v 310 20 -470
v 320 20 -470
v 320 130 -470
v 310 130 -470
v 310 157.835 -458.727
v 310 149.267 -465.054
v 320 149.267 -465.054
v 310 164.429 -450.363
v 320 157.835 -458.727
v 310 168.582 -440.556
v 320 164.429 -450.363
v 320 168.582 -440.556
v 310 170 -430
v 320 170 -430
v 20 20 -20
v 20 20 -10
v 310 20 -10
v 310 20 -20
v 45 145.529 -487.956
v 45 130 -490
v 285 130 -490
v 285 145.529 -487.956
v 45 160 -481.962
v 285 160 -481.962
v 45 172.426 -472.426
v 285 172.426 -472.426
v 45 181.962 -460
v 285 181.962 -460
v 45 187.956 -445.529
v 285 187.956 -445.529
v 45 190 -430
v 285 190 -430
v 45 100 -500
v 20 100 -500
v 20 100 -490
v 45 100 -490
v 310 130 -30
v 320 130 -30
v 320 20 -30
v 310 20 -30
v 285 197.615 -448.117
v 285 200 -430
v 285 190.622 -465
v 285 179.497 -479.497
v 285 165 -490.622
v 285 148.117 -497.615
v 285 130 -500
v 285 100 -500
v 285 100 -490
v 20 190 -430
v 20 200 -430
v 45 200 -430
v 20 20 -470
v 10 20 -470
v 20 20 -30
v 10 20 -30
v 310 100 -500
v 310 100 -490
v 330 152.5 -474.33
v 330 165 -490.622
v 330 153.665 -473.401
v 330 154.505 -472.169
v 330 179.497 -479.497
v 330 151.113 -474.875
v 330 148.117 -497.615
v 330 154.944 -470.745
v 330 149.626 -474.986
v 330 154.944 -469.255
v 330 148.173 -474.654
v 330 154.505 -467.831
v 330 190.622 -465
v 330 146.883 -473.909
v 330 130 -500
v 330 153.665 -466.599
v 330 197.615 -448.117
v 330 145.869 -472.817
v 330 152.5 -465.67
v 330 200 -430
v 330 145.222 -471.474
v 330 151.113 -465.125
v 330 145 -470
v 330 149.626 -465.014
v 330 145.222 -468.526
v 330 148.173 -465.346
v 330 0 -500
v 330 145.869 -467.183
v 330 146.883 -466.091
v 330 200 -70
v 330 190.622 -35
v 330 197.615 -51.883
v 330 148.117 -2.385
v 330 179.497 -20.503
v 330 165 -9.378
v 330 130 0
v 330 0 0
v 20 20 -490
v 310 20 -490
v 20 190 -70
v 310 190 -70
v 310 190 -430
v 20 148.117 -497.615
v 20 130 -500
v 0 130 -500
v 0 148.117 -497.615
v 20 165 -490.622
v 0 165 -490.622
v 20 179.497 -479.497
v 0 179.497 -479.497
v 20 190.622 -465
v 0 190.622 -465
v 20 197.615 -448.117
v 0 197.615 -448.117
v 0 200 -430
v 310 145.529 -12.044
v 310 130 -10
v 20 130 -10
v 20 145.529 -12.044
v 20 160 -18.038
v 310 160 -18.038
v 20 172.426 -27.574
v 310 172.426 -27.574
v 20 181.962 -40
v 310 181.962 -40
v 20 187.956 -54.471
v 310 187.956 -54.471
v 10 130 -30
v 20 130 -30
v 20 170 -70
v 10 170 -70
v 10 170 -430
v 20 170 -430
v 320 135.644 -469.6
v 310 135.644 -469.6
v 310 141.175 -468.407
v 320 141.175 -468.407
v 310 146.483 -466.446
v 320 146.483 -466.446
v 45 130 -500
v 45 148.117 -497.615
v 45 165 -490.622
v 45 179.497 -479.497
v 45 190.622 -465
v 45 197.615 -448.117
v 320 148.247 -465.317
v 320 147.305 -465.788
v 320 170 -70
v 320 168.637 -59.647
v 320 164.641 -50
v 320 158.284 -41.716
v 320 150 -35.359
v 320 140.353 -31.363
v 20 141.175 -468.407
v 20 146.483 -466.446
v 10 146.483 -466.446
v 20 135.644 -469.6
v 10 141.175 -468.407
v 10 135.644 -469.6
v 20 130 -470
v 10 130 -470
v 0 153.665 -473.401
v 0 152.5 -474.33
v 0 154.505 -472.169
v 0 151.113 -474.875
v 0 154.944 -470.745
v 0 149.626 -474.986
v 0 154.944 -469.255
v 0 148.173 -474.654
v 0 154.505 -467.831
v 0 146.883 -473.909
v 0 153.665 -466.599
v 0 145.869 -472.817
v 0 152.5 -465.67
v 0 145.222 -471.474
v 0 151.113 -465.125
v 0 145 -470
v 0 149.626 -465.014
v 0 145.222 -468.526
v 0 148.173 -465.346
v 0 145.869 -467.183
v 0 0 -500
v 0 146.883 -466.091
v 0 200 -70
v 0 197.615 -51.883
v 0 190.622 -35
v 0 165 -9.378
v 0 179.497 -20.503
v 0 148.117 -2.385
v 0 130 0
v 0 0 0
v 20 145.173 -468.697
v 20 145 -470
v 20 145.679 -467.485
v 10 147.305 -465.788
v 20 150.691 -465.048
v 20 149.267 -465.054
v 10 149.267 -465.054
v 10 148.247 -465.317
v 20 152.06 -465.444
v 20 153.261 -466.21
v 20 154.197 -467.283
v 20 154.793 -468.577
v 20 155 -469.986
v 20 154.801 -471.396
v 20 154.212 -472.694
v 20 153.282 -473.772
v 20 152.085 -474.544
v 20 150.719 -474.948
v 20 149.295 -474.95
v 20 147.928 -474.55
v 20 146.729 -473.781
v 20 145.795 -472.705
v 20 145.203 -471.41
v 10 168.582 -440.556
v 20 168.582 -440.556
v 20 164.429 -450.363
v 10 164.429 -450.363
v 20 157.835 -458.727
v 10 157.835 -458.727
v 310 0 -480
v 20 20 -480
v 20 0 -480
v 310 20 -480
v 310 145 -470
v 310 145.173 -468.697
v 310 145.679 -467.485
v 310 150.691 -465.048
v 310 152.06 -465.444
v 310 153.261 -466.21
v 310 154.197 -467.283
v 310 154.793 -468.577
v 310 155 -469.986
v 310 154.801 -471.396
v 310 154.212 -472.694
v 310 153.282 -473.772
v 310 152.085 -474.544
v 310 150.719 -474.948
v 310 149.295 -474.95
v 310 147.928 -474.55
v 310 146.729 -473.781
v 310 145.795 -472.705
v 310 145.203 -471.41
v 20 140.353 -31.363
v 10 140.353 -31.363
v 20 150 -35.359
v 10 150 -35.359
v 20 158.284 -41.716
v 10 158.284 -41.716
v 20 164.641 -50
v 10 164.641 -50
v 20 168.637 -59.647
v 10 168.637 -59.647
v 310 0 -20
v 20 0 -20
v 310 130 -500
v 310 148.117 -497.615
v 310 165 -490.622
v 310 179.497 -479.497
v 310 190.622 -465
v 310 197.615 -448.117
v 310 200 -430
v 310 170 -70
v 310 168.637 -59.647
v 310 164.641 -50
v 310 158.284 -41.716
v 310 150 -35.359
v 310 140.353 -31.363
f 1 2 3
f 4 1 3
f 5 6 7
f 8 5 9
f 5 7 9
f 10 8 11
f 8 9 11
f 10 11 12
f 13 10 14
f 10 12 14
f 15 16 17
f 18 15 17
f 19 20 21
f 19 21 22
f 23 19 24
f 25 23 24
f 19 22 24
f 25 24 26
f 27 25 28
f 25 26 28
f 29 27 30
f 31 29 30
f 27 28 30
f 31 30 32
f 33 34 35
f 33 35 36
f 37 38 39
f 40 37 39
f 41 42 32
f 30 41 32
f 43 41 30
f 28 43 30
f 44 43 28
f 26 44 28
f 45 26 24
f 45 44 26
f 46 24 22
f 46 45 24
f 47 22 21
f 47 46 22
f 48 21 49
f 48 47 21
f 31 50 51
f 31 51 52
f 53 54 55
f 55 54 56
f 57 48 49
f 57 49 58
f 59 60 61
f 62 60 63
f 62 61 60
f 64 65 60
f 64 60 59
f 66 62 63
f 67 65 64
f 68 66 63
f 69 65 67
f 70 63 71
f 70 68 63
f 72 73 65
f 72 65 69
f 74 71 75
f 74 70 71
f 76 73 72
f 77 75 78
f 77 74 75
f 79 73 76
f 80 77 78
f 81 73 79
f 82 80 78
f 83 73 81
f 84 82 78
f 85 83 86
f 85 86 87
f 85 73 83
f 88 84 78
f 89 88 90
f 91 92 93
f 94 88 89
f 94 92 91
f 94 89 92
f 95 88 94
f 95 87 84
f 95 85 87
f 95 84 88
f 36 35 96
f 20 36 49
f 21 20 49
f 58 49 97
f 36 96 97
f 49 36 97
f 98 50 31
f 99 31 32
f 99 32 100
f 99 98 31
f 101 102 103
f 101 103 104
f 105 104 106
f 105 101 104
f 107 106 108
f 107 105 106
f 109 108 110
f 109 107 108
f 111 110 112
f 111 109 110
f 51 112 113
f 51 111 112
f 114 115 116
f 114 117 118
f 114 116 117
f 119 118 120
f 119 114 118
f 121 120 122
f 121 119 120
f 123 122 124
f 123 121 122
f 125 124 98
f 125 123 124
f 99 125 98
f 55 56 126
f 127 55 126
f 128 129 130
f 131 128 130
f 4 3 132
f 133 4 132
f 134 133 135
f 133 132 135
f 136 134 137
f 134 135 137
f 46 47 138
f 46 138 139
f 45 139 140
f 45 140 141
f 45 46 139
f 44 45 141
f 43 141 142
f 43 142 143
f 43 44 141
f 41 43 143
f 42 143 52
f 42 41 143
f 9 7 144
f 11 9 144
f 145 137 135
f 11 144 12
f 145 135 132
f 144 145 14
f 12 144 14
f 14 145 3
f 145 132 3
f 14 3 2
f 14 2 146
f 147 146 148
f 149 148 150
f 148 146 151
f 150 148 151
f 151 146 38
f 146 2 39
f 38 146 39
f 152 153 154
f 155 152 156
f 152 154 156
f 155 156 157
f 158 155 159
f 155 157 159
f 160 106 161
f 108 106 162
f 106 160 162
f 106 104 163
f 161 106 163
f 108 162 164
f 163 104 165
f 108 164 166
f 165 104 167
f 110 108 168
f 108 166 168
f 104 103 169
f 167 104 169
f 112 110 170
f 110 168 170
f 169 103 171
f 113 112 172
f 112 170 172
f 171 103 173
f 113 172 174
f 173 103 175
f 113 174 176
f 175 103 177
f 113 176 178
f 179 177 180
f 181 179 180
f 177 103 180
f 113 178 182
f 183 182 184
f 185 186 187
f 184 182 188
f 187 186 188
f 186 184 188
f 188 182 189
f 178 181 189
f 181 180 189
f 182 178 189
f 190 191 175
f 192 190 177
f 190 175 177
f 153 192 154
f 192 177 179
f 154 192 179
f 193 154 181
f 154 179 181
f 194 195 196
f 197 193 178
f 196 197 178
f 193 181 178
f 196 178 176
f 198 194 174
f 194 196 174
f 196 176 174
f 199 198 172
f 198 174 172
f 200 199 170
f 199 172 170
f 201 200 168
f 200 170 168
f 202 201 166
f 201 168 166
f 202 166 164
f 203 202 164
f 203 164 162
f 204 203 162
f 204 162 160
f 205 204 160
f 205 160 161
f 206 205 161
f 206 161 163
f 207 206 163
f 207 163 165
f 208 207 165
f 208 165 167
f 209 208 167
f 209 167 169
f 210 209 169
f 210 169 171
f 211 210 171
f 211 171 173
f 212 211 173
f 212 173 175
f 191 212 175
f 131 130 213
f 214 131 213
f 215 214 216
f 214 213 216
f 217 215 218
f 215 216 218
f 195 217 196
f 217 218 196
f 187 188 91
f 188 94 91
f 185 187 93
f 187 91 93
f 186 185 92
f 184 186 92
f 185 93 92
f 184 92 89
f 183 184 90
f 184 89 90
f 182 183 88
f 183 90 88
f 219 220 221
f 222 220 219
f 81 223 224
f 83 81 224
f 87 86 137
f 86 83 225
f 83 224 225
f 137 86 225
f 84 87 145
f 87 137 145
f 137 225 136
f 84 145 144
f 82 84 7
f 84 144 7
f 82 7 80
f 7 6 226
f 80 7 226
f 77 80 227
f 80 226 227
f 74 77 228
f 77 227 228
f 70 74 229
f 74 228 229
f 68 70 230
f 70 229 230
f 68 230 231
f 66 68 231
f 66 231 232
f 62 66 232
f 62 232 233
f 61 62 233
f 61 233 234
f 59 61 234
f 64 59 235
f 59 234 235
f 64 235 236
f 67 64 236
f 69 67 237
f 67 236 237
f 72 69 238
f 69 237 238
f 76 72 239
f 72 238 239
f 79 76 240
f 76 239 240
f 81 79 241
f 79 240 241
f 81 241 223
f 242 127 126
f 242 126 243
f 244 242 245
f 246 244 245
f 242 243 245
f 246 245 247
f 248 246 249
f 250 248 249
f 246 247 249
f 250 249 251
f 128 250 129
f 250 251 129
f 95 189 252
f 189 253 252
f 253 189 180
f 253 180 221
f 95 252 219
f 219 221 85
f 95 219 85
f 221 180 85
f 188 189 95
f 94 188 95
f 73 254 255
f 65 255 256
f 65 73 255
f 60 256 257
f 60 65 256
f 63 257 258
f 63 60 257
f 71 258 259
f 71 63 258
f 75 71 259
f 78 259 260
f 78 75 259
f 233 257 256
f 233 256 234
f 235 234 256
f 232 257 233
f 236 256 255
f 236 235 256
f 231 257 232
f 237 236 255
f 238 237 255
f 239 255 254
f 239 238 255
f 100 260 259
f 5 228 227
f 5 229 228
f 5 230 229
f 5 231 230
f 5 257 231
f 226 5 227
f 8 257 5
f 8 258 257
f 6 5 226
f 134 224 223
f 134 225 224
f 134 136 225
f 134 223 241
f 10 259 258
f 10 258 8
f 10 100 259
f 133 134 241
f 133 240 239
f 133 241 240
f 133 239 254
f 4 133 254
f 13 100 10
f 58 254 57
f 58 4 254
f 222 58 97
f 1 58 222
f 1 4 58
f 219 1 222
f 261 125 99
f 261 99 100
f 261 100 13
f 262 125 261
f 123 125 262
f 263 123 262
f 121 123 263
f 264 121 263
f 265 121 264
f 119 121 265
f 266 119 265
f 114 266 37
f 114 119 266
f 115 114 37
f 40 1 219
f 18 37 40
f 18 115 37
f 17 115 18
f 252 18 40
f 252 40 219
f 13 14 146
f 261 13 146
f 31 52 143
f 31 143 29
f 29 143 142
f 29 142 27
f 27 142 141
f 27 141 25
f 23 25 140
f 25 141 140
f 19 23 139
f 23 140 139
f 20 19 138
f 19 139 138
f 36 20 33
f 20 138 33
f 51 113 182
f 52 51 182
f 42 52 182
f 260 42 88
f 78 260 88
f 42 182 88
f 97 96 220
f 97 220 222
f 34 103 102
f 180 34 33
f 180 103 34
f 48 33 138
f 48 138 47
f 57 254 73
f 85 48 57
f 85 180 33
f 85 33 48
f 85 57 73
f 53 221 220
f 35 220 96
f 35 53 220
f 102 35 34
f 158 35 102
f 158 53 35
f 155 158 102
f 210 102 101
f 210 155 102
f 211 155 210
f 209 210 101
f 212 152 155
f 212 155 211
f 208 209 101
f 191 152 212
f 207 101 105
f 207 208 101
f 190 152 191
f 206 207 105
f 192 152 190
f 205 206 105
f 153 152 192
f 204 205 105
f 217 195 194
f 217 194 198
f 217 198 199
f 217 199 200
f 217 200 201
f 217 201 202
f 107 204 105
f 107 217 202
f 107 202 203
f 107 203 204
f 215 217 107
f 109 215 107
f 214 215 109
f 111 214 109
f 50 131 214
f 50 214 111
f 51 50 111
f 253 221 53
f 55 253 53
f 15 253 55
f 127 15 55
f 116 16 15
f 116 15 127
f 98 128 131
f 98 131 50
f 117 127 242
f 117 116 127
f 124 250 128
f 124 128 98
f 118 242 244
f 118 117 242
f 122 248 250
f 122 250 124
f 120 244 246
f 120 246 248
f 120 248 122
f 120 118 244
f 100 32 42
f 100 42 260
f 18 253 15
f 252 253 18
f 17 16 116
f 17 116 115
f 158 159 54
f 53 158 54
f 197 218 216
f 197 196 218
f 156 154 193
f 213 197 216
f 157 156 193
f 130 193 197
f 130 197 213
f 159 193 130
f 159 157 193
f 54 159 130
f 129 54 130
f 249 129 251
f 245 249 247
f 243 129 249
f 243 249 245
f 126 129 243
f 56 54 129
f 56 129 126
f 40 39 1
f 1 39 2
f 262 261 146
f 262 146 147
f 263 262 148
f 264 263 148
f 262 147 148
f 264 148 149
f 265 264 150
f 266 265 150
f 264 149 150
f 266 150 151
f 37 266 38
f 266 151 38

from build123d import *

# Parameters (mm, degrees)
F0_W      = 330
F0_H      = 500
F1_DEPTH  = 200
F2_R      = 70
F3_T      = -10
F5_DEPTH  = 10
F7_DEPTH  = 10
F8_W      = 290
F8_H      = 20
F9_DEPTH  = 10
F10_W     = 290
F10_H     = 20
F11_DEPTH = 10
F13_W     = 25
F13_H     = 100
F14_DEPTH = 70
F15_R     = 5
F16_DEPTH = 330.001


with BuildPart() as f1:
    # F0 (on Front) → F1 (new body)
    with BuildSketch(Plane.XZ):
        with Locations((165, -250)):
            Rectangle(F0_W, F0_H)
    extrude(amount=-F1_DEPTH)

    # F2
    f2_edges = [f1.edges().sort_by_distance(p)[0] for p in [
        (165, 200, 0),
        (165, 200, -500),
    ]]
    fillet(f2_edges, radius=F2_R)

    # F3
    f3_openings = [f1.faces().sort_by_distance(p)[0] for p in [
        (165, 0, -250),
    ]]
    offset(amount=F3_T, openings=f3_openings)

    # F4 (on face) → F5 (join)
    with BuildSketch(Plane.YZ.offset(10)):
        with BuildLine():
            ThreePointArc((190, -70), (172.426407, -27.573593), (130, -10))
            Line((130, -10), (0, -10))
            Line((0, -10), (0, -490))
            Line((0, -490), (130, -490))
            ThreePointArc((130, -490), (172.426407, -472.426407), (190, -430))
            Line((190, -430), (190, -70))
        make_face()
        with BuildLine():
            ThreePointArc((170, -430), (158.284271, -458.284271), (130, -470))
            Line((130, -470), (20, -470))
            Line((20, -470), (20, -30))
            Line((20, -30), (130, -30))
            ThreePointArc((130, -30), (158.284271, -41.715729), (170, -70))
            Line((170, -70), (170, -430))
        make_face(mode=Mode.SUBTRACT)
    extrude(amount=F5_DEPTH)

    # F6 (on face) → F7 (join)
    with BuildSketch(Plane(origin=(320, 0, 0), x_dir=(0, -1, 0), z_dir=(-1, 0, 0))):
        with BuildLine():
            ThreePointArc((-190, -430), (-172.426407, -472.426407), (-130, -490))
            Line((-130, -490), (0, -490))
            Line((0, -490), (0, -10))
            Line((0, -10), (-130, -10))
            ThreePointArc((-130, -10), (-172.426407, -27.573593), (-190, -70))
            Line((-190, -70), (-190, -430))
        make_face()
        with BuildLine():
            Line((-20, -470), (-130, -470))
            ThreePointArc((-130, -470), (-158.284271, -458.284271), (-170, -430))
            Line((-170, -430), (-170, -70))
            ThreePointArc((-170, -70), (-158.284271, -41.715729), (-130, -30))
            Line((-130, -30), (-20, -30))
            Line((-20, -30), (-20, -470))
        make_face(mode=Mode.SUBTRACT)
    extrude(amount=F7_DEPTH)

    # F8 (on face) → F9 (join)
    with BuildSketch(Plane.XY.offset(-490)):
        with Locations((165, 10)):
            Rectangle(F8_W, F8_H)
    extrude(amount=F9_DEPTH)

    # F10 (on face) → F11 (join)
    with BuildSketch(Plane(origin=(0, 0, -10), x_dir=(1, 0, 0), z_dir=(0, 0, -1))):
        with Locations((165, -10)):
            Rectangle(F10_W, F10_H)
    extrude(amount=F11_DEPTH)

    # F13 (on face) → F14 (cut)
    with BuildSketch(Plane(origin=(0, 0, -500), x_dir=(1, 0, 0), z_dir=(0, 0, -1))):
        with Locations((32.5, -150)):
            Rectangle(F13_W, F13_H)
        with Locations((297.5, -150)):
            Rectangle(F13_W, F13_H)
    extrude(amount=-F14_DEPTH, mode=Mode.SUBTRACT)

    # F15 (on face) → F16 (cut, through all)
    with BuildSketch(Plane(origin=(0, 0, 0), x_dir=(0, -1, 0), z_dir=(-1, 0, 0))):
        with Locations((-150, -470)):
            Circle(F15_R)
    extrude(amount=-F16_DEPTH, mode=Mode.SUBTRACT)


solid = f1.part
